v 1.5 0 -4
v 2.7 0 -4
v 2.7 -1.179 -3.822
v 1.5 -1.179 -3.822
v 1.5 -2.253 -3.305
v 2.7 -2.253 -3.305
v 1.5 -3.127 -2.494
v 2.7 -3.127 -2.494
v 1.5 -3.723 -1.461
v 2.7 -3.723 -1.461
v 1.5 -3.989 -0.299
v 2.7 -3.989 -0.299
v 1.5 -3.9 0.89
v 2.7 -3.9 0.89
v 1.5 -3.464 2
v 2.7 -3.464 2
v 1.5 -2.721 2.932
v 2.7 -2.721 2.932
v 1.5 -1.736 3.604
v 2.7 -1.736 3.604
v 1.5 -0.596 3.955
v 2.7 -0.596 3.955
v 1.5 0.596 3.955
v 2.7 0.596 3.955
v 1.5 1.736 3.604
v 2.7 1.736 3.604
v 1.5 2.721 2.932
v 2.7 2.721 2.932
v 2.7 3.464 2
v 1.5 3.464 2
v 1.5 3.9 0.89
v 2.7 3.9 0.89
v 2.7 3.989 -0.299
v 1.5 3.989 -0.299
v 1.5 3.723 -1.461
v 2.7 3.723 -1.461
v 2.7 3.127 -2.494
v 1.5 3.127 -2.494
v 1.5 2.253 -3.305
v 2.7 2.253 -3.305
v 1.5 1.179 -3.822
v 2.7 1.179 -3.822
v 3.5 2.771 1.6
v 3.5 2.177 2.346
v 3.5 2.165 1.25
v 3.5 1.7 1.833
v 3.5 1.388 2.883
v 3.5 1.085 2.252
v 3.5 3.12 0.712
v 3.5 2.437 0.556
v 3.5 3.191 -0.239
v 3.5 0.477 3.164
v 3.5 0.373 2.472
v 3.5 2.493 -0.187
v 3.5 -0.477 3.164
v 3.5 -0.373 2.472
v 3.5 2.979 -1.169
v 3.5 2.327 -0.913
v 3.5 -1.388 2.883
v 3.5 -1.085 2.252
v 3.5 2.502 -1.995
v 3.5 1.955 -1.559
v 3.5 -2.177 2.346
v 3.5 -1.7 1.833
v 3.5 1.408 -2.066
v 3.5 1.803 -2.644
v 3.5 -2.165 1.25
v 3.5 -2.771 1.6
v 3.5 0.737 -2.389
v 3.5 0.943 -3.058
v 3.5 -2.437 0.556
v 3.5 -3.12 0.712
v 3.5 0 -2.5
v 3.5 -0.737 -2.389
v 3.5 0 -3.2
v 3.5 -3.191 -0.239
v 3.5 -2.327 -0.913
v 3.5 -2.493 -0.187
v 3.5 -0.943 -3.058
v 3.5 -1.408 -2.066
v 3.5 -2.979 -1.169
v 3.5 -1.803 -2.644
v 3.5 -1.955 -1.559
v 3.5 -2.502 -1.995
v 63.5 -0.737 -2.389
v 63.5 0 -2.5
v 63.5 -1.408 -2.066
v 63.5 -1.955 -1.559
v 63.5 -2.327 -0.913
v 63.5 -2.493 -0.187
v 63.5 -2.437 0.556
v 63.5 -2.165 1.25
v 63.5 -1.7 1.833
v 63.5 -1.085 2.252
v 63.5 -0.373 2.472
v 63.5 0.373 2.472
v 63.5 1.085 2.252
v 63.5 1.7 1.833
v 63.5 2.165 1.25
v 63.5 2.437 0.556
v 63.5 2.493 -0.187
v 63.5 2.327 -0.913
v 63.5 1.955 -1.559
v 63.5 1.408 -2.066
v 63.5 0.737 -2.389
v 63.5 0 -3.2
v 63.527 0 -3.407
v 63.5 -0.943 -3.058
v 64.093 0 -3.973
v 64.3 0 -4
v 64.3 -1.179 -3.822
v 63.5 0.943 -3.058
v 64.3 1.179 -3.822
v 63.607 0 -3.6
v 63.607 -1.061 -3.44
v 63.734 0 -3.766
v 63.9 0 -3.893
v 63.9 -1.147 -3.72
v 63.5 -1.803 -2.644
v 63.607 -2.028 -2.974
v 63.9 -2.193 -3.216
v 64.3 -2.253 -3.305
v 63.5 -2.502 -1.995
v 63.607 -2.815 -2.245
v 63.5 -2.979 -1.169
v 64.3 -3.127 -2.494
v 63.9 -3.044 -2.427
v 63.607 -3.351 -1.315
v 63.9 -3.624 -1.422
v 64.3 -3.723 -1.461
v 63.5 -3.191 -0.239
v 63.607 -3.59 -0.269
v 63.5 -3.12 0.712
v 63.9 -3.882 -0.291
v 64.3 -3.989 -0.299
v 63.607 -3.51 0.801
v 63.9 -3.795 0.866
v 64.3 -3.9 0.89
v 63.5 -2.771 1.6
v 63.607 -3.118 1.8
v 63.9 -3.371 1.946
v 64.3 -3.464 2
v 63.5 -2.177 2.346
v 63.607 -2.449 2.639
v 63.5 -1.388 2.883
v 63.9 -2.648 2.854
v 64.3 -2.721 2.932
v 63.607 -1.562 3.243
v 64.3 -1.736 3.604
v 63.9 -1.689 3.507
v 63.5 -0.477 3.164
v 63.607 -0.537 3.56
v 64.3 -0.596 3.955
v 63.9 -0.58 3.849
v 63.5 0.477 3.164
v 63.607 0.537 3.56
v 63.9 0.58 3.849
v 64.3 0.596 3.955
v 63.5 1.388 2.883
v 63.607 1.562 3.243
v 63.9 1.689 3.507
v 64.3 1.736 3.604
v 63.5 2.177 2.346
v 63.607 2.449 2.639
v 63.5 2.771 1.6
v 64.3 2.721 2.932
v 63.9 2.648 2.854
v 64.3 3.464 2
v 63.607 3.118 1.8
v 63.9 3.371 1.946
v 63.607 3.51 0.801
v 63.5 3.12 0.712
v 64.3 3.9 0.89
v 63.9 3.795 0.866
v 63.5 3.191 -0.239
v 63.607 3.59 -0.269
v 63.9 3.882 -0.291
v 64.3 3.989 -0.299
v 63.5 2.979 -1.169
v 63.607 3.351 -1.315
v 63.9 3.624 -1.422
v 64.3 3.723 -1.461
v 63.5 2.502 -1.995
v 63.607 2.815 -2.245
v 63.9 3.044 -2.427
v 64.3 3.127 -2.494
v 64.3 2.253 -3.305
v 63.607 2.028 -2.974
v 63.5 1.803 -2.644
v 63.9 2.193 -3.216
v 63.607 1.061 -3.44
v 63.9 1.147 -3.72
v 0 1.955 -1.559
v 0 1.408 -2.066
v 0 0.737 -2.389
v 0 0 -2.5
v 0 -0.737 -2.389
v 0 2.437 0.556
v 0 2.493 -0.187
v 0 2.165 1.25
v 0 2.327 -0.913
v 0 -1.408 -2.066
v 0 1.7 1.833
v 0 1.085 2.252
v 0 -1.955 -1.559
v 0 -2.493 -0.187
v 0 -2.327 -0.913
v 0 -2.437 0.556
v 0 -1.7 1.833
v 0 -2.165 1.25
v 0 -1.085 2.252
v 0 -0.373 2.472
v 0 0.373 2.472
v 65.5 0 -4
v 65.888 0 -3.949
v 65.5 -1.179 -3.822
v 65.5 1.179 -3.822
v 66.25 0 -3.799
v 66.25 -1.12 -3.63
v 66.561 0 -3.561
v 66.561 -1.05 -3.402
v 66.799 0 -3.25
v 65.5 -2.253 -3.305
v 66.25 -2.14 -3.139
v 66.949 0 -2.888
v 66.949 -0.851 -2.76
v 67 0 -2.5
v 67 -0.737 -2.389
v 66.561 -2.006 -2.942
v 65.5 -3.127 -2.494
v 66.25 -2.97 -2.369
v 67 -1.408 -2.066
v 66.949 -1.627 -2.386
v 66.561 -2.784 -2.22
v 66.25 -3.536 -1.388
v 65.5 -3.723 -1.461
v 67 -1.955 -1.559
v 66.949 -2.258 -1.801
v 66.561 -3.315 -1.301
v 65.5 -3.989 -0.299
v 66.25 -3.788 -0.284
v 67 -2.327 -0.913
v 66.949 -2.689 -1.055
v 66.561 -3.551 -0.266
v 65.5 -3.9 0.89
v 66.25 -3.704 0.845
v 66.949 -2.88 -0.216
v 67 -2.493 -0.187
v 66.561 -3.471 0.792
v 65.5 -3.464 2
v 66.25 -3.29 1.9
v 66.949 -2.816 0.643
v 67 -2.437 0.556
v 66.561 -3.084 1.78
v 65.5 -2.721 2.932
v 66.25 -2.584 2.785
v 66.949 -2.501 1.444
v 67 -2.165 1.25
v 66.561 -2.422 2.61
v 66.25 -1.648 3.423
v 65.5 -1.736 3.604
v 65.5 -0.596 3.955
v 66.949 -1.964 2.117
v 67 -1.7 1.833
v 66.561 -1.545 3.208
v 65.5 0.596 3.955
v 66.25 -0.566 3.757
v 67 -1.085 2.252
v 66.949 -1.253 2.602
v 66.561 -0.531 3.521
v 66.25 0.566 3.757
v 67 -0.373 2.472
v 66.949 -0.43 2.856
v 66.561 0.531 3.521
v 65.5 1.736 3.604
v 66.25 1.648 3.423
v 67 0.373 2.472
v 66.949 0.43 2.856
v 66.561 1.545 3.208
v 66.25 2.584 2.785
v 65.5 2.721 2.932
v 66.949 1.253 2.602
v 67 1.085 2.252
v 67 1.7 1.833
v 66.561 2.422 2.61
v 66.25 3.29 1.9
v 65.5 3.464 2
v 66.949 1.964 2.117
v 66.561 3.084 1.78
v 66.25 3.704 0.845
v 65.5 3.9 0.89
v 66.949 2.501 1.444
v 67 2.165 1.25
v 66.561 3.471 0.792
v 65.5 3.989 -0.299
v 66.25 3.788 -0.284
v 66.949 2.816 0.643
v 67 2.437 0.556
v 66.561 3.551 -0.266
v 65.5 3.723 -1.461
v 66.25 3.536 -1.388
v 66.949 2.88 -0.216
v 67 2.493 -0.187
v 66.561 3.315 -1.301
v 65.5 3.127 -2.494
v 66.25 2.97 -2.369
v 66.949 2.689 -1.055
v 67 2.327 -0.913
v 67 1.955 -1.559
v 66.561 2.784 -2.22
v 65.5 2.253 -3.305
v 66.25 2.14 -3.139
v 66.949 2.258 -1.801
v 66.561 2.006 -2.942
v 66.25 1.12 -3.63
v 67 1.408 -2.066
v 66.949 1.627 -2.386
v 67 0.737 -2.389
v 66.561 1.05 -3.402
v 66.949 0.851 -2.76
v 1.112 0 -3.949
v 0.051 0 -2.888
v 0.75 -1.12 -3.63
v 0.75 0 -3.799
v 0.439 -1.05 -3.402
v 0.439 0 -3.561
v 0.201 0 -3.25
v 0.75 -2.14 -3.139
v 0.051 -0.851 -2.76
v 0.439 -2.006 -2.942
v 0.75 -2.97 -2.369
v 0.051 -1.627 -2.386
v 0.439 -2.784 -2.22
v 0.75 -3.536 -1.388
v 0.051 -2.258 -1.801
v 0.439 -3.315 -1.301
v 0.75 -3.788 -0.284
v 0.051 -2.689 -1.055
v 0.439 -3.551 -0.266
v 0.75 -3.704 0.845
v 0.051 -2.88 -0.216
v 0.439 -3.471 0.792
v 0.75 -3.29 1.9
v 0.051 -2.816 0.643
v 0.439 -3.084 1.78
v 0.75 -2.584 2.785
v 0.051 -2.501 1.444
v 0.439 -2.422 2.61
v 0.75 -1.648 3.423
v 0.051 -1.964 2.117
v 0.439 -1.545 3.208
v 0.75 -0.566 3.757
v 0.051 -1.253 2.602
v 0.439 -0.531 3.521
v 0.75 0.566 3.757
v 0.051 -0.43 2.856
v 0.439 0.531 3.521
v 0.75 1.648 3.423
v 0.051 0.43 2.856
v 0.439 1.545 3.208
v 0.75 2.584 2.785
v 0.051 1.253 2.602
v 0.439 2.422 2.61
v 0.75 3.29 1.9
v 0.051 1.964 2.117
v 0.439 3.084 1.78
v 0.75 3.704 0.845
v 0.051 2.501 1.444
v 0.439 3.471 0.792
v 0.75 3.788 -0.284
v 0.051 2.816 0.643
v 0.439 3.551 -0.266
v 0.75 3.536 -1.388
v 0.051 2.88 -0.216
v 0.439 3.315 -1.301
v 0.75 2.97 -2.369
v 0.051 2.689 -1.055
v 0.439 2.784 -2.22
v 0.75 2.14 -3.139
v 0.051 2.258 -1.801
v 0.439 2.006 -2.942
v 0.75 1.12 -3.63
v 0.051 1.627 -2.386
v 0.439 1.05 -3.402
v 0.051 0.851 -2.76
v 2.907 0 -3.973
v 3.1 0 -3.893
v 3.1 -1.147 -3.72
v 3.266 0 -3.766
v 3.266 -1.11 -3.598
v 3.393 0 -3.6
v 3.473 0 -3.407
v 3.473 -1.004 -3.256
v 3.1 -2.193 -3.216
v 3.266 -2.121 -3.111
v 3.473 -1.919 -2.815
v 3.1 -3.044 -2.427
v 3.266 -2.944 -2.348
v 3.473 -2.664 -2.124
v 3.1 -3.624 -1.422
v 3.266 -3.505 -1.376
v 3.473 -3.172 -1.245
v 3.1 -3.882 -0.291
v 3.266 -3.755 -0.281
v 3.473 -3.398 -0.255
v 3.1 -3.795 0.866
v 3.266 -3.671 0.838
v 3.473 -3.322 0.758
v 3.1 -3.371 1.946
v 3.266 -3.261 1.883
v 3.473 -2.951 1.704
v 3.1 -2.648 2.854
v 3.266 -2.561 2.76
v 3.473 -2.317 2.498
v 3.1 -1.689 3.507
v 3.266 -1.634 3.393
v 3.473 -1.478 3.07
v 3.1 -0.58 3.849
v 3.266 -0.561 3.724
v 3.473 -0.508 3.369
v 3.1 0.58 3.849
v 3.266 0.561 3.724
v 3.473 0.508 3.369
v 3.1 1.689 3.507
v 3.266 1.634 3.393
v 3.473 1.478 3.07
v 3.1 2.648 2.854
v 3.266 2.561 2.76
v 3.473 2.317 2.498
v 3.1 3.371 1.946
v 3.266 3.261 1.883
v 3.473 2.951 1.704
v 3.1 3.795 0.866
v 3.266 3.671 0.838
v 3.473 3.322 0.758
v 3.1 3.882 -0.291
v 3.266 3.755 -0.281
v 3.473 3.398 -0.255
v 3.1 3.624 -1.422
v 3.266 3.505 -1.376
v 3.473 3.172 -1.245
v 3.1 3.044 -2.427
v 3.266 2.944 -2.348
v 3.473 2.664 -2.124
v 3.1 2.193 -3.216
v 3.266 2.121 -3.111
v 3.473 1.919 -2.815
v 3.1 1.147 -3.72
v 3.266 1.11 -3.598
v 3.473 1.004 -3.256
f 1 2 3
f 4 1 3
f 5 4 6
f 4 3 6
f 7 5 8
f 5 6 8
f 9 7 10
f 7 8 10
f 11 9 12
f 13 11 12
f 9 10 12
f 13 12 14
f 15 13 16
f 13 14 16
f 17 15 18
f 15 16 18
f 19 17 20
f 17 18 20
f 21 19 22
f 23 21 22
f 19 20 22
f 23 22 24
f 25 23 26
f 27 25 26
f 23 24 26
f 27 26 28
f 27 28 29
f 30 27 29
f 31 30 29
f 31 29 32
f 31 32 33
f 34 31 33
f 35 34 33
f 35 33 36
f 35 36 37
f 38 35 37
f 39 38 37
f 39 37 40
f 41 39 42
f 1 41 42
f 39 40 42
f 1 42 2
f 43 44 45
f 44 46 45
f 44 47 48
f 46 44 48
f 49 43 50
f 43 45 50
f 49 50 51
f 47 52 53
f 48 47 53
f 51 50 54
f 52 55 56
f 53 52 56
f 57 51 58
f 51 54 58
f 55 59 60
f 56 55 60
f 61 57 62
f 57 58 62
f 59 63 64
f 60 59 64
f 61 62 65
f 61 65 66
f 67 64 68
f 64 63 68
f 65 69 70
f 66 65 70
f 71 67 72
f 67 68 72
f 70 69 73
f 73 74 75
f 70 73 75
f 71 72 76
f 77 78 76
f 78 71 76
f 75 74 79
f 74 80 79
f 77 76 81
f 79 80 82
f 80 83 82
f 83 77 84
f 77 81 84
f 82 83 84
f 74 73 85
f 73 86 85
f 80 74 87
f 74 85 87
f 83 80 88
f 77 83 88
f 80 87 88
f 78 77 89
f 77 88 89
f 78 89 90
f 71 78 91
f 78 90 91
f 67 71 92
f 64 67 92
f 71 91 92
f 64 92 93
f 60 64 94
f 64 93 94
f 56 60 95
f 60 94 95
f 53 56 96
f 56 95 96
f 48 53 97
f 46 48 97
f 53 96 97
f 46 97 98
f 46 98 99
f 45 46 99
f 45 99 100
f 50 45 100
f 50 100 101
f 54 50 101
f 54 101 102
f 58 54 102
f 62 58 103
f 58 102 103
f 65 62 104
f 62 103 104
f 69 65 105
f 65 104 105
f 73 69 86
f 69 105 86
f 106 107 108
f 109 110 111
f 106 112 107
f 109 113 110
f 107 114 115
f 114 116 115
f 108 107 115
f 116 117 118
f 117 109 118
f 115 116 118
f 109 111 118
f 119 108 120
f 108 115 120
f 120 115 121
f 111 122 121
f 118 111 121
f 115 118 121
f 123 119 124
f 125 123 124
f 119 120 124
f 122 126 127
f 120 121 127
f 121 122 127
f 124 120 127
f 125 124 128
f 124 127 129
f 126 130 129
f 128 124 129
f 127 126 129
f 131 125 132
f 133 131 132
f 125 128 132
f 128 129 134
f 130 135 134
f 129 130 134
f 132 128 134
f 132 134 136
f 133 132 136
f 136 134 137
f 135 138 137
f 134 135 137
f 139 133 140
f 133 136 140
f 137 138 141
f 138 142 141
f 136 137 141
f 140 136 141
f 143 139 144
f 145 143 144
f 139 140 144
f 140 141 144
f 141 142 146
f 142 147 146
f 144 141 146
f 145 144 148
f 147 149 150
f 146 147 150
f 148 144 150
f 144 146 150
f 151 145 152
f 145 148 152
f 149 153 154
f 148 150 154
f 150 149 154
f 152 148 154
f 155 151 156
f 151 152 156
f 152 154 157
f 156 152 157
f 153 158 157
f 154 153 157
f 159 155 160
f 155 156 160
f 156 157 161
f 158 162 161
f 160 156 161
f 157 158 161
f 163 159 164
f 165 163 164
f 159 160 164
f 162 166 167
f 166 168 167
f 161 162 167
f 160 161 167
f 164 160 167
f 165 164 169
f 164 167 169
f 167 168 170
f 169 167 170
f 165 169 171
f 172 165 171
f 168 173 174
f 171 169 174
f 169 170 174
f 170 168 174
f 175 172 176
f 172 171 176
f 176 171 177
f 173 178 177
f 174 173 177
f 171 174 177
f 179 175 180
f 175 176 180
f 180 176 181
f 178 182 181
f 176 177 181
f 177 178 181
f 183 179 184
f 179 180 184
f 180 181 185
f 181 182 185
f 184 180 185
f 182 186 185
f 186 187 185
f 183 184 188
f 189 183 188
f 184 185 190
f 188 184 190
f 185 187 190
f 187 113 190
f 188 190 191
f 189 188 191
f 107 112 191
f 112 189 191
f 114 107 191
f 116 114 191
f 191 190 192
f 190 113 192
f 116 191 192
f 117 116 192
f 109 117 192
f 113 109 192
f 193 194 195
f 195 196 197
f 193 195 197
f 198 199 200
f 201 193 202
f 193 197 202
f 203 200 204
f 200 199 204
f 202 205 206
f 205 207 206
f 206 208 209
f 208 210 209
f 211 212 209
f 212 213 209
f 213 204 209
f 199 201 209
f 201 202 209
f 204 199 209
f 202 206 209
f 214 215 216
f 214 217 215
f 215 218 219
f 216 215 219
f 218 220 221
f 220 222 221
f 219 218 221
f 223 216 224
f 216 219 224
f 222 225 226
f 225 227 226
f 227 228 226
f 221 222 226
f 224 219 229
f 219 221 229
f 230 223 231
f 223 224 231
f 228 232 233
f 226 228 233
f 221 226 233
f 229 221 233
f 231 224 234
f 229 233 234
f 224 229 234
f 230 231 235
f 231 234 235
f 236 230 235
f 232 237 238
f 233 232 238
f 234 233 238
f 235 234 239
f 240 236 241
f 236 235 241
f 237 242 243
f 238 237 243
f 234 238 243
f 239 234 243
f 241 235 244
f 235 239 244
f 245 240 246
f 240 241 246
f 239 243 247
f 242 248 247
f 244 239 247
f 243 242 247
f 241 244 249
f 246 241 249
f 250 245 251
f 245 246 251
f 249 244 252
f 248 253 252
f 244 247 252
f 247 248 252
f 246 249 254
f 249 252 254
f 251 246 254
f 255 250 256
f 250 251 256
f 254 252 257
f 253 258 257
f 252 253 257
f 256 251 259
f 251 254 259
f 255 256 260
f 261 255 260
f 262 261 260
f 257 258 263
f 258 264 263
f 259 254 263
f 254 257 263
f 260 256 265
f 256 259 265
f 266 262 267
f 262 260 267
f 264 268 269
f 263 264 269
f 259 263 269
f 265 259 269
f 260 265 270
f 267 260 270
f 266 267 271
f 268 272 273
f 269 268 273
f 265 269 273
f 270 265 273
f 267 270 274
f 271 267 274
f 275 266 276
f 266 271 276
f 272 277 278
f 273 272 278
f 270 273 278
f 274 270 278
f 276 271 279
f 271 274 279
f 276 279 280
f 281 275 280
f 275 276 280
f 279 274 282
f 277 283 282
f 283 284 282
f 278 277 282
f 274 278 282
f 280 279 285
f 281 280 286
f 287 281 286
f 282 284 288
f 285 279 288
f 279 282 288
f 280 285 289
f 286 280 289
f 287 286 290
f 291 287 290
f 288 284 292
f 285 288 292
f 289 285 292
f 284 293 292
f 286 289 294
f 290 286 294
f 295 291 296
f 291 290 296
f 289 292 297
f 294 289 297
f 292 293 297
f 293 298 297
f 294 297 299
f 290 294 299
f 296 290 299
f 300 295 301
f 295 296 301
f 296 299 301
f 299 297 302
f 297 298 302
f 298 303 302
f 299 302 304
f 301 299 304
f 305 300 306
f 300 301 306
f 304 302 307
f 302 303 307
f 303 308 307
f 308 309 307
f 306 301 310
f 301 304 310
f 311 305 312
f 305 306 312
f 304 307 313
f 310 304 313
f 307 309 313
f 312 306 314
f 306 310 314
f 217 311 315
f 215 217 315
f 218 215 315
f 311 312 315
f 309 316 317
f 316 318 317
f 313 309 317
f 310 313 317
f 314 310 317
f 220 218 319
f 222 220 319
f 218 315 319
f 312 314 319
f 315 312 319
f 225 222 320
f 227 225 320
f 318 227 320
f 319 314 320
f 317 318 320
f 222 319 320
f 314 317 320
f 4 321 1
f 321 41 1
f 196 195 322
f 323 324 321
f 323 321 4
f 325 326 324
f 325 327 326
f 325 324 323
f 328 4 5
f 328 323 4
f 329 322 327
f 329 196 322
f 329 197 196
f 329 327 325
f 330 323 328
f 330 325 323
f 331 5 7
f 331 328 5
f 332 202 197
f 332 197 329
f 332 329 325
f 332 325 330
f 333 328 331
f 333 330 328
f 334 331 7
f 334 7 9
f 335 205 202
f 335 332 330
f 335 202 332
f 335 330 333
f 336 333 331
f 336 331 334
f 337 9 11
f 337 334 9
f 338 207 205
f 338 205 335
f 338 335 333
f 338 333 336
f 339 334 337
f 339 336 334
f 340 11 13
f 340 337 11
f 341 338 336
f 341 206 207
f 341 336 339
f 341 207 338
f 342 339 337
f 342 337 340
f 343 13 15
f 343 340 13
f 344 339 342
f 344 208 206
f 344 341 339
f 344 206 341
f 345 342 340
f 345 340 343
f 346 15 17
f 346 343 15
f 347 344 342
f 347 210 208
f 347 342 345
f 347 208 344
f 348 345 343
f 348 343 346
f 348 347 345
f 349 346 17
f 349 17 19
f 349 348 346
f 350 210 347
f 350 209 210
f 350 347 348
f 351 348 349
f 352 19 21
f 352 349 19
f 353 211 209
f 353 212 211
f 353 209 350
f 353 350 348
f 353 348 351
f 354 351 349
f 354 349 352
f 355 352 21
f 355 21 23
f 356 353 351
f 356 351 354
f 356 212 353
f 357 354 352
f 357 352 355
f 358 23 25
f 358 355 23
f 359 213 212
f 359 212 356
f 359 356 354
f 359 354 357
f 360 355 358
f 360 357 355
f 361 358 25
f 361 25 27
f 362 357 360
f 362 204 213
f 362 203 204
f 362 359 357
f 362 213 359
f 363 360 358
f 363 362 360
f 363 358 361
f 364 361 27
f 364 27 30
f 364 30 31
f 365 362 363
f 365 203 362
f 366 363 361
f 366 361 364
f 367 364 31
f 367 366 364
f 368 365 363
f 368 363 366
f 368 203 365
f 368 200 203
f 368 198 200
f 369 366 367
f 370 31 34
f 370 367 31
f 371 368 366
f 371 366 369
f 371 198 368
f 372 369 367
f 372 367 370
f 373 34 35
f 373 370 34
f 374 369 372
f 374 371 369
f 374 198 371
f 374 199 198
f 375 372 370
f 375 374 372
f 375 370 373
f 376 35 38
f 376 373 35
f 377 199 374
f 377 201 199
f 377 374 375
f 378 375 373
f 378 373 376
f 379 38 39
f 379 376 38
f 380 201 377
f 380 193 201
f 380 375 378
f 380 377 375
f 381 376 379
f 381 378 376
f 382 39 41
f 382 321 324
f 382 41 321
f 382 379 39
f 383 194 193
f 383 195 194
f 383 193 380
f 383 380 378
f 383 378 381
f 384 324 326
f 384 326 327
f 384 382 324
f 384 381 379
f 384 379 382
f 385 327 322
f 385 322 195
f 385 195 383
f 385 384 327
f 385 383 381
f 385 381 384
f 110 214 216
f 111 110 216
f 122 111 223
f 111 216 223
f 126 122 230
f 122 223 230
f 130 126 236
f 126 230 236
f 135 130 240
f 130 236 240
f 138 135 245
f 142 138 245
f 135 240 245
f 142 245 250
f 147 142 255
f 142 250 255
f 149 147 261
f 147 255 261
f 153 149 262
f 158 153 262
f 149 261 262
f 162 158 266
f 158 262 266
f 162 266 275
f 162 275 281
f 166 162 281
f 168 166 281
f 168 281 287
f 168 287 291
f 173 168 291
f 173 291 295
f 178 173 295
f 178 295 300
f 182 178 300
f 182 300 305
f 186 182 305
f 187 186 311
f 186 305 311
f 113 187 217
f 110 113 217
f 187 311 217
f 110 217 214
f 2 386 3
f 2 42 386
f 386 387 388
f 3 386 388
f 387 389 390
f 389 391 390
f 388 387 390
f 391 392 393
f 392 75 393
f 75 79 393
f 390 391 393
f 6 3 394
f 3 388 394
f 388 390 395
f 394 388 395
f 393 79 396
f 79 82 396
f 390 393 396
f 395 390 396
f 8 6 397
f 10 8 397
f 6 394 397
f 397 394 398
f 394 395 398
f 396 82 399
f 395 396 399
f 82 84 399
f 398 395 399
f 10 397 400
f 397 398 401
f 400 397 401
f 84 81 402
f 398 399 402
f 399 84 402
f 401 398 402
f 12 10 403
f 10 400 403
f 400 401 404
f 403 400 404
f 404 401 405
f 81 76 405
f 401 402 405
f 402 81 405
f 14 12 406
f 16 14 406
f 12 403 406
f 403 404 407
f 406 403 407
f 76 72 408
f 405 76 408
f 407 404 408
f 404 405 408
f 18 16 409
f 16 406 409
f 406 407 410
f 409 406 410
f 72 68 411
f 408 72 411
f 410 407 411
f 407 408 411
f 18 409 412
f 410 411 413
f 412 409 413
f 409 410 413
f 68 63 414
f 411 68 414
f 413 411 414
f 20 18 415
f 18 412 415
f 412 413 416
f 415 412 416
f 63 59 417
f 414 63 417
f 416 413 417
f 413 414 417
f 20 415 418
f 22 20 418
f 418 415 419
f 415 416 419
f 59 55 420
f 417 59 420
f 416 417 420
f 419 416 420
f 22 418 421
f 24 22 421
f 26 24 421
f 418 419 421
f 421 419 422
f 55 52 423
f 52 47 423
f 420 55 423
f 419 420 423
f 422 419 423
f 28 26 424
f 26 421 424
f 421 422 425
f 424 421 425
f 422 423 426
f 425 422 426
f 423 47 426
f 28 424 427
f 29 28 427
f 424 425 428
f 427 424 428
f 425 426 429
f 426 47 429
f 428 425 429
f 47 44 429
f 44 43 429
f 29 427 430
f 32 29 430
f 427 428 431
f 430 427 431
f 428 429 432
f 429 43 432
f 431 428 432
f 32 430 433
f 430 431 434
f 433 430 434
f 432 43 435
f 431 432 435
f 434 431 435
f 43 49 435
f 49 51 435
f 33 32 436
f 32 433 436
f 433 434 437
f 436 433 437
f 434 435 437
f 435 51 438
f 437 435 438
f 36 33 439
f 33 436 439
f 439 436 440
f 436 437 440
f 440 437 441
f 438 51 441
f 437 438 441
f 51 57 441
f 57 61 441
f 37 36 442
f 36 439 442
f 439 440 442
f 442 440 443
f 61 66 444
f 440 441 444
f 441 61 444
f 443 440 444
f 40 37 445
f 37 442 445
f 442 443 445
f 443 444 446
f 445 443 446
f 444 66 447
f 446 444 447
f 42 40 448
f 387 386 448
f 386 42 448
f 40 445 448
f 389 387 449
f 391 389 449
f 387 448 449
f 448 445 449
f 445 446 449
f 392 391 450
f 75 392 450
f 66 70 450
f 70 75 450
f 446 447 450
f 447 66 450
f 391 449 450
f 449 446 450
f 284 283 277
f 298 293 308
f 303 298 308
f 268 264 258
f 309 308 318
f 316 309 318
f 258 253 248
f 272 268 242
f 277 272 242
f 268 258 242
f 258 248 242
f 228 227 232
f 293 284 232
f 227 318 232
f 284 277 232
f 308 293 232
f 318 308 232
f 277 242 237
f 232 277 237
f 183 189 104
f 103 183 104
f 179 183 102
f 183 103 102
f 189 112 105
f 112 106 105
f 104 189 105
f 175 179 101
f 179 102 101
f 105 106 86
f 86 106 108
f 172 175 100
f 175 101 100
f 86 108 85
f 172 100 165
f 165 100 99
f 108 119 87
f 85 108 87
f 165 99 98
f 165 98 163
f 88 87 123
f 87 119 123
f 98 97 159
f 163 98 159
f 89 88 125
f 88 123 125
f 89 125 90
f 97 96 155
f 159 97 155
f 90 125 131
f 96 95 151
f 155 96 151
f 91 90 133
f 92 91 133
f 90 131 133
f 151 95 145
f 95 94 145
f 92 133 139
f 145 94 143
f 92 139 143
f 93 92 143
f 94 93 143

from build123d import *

# Parameters (mm, degrees)
FILLET_1_R = 0.8
FILLET_2_R = 1.5


with BuildPart() as part:
    # Эскиз1 → Повернуть1 (revolve)
    with BuildSketch(Plane.XY, mode=Mode.PRIVATE) as revolve_1_sk:
        Polygon((0, 0), (0, 4), (3.5, 4), (3.5, 2.5), (63.5, 2.5), (63.5, 4), (67, 4), (67, 0), align=None)
    revolve(revolve_1_sk.sketch.rotate(Axis((0, 0, 0), (-1, 0, 0)), 90), axis=Axis((0, 0, 0), (-1, 0, 0)))

    # Скругление1
    fillet_1_edges = [part.edges().sort_by_distance(p)[0] for p in [
        (63.5, 0, 4),
        (3.5, 0, 4),
    ]]
    fillet(fillet_1_edges, radius=FILLET_1_R)

    # Скругление2
    fillet_2_edges = [part.edges().sort_by_distance(p)[0] for p in [
        (67, 0, 4),
        (0, 0, 4),
    ]]
    fillet(fillet_2_edges, radius=FILLET_2_R)


solid = part.part
